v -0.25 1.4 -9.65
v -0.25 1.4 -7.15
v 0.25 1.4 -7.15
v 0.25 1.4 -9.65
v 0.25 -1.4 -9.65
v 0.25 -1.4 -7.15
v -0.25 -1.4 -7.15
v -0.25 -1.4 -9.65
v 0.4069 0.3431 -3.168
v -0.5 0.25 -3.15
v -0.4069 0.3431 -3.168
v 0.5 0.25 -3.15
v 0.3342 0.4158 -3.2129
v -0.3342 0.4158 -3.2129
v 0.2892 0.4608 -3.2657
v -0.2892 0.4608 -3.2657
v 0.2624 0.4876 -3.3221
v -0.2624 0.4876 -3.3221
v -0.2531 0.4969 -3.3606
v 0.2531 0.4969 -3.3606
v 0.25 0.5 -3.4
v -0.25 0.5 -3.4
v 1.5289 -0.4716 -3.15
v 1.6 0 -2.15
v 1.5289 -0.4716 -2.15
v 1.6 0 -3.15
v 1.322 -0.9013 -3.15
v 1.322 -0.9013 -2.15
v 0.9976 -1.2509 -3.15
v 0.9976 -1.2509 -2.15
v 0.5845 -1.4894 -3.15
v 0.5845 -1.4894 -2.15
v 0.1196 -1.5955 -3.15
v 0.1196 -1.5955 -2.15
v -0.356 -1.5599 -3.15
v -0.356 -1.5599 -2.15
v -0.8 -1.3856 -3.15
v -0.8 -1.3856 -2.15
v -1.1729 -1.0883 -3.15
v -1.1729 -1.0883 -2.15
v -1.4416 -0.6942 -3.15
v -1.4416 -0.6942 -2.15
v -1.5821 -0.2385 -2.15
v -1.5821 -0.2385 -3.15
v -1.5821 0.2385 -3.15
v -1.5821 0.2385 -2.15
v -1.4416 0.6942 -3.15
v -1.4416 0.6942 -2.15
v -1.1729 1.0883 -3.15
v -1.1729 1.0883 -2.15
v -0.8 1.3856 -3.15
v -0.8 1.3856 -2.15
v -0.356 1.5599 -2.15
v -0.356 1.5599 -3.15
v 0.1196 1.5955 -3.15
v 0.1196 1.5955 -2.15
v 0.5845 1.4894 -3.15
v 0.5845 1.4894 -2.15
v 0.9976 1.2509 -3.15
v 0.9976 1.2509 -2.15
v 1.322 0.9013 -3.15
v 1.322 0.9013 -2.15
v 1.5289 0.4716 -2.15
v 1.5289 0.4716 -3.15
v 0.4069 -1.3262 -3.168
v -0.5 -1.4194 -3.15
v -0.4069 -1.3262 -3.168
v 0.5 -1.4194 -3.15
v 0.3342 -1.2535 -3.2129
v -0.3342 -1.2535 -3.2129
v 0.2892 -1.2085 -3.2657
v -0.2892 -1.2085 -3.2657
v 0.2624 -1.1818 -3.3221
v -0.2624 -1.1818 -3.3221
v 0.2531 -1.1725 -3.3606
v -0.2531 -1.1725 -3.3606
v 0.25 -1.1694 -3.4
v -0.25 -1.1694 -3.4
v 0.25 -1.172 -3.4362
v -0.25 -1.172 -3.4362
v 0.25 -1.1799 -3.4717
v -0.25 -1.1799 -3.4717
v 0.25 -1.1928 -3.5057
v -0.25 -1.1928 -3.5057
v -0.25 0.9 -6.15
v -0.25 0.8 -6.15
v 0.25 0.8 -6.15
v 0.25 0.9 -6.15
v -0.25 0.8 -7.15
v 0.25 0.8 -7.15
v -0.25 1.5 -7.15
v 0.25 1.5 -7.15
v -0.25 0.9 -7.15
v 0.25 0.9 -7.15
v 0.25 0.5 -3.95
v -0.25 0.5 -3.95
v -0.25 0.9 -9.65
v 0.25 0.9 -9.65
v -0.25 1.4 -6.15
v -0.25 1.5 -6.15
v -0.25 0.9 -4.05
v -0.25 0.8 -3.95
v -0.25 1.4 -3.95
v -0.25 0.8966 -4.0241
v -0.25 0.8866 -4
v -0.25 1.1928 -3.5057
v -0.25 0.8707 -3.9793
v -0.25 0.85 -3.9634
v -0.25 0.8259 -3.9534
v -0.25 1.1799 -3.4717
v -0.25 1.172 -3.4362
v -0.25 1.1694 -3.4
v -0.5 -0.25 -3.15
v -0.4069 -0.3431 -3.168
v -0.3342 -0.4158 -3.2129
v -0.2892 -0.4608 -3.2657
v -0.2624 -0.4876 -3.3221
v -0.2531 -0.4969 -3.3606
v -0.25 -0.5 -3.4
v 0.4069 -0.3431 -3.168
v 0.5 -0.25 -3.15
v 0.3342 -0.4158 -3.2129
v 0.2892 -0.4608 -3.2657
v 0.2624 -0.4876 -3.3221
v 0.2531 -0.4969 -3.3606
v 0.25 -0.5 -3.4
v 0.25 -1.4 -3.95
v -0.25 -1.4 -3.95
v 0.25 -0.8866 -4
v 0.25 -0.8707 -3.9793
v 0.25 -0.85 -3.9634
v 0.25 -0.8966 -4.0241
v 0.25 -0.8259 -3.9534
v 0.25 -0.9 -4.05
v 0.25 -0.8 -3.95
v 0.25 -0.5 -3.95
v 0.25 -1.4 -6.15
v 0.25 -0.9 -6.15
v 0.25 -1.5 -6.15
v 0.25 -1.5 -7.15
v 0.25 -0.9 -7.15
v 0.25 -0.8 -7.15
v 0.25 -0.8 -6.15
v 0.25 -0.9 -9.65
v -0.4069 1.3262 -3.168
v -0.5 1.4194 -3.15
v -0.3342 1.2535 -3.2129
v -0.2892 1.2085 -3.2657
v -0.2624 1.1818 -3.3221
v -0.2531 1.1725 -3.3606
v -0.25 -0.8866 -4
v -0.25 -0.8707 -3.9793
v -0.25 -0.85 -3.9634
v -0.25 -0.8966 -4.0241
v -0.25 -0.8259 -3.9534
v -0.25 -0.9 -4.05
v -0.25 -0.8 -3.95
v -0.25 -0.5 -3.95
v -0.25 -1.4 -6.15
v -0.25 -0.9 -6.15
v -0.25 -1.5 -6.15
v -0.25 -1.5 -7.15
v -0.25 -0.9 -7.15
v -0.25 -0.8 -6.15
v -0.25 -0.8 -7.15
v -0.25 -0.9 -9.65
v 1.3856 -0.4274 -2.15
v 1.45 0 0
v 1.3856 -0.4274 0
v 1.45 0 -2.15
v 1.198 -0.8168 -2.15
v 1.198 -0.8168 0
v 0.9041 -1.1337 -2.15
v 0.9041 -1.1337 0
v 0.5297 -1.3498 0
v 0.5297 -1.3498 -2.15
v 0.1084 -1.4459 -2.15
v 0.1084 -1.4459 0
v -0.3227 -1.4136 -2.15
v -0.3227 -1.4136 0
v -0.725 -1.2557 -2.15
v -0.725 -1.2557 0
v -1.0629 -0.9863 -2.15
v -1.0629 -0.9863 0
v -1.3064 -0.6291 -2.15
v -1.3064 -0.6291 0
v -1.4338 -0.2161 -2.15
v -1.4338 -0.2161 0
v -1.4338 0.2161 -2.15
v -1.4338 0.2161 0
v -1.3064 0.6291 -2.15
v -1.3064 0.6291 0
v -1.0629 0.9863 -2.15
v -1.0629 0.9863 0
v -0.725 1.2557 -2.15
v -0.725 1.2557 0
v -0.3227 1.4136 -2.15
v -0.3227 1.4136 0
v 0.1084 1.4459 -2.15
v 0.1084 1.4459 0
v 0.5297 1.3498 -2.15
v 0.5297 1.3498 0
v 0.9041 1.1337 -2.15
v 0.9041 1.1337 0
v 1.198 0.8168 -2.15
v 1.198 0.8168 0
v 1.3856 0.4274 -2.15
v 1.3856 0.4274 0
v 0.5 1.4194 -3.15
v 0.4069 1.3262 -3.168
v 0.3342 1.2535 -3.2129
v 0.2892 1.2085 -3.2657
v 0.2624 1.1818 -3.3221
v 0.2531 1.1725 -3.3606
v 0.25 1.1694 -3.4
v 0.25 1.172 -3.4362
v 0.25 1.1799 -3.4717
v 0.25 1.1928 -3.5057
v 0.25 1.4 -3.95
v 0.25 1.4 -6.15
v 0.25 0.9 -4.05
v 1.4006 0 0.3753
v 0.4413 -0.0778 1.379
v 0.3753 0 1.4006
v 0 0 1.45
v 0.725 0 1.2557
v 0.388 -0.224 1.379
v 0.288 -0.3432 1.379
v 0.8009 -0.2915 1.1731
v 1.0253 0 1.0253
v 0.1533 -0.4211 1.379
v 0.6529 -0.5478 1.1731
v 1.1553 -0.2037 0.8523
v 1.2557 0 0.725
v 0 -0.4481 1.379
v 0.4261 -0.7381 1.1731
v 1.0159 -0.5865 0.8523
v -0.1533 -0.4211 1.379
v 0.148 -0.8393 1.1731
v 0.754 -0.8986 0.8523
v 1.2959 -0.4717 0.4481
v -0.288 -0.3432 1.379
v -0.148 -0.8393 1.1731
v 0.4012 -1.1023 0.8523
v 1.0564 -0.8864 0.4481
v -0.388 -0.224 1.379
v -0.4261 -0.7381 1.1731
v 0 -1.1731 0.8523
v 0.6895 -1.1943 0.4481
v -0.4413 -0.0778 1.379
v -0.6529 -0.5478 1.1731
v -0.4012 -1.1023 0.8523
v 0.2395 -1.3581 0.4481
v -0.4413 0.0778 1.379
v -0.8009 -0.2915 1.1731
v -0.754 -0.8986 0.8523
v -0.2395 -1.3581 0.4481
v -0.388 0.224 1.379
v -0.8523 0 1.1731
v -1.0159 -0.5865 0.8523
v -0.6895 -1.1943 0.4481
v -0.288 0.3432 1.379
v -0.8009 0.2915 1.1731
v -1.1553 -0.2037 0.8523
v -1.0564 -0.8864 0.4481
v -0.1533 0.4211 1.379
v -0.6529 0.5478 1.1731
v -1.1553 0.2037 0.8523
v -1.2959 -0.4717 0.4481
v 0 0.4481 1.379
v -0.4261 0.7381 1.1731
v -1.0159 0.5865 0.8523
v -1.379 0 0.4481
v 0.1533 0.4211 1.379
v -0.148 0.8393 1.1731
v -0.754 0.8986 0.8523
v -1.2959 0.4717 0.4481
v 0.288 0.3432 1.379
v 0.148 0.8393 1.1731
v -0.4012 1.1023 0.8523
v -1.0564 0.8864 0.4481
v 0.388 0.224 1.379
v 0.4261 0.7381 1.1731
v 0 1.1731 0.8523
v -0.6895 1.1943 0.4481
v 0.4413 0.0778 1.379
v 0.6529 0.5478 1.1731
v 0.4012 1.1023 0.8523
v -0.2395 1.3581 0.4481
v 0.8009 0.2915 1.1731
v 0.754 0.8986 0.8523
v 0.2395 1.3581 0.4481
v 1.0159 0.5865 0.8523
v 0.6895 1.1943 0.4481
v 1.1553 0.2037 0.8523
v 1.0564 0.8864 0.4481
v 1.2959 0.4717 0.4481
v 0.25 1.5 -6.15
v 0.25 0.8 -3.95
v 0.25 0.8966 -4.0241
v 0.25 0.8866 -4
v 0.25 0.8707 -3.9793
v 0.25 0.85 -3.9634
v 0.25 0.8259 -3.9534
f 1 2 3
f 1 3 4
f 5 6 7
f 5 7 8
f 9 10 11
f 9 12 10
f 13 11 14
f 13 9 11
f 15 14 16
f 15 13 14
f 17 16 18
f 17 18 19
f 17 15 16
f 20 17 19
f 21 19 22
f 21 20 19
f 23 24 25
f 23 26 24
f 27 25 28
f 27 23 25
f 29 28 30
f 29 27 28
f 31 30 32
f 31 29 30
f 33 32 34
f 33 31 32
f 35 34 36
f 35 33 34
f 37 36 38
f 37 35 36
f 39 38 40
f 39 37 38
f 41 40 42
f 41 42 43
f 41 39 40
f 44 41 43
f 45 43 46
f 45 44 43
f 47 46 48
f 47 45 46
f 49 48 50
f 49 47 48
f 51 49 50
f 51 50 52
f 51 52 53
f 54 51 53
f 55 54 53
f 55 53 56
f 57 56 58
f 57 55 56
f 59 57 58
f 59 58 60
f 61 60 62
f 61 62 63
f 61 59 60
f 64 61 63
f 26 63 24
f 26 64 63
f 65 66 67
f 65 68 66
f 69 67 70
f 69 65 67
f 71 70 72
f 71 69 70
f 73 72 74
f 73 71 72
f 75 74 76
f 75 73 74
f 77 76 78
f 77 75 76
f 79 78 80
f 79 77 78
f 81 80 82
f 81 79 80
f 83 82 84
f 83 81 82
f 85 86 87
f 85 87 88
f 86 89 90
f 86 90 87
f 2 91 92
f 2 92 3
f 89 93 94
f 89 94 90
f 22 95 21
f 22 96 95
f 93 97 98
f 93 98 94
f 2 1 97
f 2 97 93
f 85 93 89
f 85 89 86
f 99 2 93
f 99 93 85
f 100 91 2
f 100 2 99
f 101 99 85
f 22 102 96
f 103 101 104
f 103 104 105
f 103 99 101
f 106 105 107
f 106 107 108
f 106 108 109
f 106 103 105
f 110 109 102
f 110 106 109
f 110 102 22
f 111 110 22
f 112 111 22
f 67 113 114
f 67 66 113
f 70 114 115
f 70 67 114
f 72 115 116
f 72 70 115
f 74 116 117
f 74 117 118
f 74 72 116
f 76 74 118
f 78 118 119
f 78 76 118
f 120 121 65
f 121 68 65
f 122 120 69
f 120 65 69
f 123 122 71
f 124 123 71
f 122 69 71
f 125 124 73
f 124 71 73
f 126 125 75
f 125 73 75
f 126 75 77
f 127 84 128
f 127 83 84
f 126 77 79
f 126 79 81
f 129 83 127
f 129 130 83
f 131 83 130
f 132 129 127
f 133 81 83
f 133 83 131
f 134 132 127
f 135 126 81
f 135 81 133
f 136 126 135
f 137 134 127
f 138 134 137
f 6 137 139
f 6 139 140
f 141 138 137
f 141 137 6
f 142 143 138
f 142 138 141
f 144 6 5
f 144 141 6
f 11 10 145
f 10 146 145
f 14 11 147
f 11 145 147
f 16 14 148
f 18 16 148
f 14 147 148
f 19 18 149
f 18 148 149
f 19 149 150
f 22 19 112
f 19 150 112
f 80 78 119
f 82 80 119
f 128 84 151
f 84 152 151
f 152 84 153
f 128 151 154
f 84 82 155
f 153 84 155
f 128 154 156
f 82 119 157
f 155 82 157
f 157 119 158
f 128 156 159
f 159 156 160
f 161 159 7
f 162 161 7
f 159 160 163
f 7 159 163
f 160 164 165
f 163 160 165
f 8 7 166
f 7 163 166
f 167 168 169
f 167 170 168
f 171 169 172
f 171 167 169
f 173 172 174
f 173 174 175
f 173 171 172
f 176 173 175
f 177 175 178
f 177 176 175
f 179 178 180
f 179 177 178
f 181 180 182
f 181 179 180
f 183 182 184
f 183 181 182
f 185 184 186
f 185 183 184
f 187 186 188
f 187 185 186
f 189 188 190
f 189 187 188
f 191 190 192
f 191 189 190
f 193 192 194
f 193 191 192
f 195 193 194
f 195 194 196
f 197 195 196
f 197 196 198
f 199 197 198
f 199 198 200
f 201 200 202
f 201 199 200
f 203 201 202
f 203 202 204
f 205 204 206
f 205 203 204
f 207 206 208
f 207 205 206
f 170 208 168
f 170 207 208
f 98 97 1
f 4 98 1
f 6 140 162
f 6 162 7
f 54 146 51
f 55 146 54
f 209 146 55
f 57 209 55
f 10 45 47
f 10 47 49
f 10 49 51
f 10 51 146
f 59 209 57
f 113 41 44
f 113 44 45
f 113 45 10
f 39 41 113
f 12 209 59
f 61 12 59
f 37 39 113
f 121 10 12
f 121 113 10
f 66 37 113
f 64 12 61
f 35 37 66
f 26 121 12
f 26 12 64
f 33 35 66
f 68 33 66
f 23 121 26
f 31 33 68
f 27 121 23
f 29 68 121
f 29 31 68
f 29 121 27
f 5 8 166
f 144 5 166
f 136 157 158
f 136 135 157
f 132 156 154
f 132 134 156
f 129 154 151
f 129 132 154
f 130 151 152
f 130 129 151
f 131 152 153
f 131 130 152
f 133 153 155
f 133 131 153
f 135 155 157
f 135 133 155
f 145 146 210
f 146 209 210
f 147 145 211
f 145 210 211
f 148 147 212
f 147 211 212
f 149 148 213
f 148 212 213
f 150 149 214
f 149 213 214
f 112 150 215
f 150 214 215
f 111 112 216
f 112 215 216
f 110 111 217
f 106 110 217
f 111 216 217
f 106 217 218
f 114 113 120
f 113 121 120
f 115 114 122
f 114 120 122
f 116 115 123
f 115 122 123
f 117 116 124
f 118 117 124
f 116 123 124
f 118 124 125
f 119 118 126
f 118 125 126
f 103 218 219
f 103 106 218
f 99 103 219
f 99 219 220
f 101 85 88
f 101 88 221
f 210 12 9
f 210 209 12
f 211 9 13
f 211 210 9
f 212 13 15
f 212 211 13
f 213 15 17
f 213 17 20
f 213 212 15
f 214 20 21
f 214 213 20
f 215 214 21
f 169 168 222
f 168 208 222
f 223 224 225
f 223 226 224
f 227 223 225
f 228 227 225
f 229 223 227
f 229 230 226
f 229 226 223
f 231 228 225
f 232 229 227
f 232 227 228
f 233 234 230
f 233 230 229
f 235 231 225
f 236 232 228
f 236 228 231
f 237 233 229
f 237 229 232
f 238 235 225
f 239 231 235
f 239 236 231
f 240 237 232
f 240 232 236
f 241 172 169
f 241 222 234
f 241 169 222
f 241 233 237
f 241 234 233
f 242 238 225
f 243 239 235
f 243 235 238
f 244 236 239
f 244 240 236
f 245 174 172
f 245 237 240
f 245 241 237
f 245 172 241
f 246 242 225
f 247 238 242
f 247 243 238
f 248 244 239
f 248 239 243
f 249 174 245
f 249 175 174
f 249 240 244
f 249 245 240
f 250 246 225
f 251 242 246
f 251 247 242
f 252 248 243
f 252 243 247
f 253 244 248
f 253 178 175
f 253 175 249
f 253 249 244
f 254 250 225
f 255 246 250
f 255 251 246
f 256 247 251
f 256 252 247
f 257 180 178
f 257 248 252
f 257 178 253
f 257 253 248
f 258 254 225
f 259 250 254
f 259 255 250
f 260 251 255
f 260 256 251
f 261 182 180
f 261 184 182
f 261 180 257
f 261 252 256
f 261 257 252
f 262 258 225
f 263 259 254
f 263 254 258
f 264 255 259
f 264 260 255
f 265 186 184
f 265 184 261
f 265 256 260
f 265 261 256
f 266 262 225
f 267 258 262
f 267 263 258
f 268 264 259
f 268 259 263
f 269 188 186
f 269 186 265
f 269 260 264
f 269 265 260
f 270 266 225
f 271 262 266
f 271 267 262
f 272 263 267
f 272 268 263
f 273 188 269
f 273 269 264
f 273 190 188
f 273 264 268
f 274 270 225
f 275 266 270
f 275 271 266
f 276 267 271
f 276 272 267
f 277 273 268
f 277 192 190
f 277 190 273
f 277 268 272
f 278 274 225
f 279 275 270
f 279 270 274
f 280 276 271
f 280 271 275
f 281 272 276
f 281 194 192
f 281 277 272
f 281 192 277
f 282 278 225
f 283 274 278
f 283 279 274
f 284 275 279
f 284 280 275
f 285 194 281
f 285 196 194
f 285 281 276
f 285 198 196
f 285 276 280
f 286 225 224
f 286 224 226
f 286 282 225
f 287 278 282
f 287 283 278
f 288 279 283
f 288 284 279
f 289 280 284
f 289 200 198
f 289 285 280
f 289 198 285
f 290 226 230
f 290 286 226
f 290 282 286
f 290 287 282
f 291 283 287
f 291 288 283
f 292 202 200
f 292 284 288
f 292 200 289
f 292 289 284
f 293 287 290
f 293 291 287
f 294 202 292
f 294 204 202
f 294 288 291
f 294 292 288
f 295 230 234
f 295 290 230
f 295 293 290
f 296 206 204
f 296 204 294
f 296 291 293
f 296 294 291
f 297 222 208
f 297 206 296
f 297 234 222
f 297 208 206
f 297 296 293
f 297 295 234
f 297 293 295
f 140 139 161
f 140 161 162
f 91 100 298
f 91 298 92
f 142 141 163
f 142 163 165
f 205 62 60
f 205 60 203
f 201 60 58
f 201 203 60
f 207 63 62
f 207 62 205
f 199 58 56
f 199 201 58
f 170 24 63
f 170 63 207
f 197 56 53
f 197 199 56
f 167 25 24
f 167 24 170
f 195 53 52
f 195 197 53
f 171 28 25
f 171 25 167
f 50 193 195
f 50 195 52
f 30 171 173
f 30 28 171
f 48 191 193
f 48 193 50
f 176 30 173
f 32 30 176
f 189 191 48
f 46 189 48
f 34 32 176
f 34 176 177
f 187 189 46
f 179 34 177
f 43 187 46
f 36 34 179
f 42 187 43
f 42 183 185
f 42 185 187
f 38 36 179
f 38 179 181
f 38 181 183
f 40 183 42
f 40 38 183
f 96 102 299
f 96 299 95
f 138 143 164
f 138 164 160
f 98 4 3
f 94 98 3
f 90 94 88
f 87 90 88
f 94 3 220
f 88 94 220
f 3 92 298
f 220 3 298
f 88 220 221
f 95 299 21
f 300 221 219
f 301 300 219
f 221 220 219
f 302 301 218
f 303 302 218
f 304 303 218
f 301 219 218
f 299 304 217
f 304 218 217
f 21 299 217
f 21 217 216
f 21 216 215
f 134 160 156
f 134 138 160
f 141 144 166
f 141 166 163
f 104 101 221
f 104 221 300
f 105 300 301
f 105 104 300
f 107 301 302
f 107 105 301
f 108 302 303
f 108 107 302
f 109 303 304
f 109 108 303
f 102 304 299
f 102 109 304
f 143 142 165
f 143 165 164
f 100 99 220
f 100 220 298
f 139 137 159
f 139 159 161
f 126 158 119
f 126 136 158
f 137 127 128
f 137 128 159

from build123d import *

# Parameters (mm, degrees)
EXTRUDE1_DEPTH          = 0.25
FILLET1_R               = 0.25
CUT_EXTRUDE1_DEPTH      = 31.234789562
CUT_EXTRUDE1_DEPTH_BACK = 31.234789562
SKETCH3_W               = 12.882415547
SKETCH3_H               = 2.8
CUT_EXTRUDE2_DEPTH      = 19.290502996
CUT_EXTRUDE2_DEPTH_BACK = 19.290502996
SKETCH4_W               = 11.746427447
SKETCH4_H               = 5.813888333


with BuildPart() as part:
    # Sketch1 → Revolve1 (revolve)
    with BuildSketch(Plane(origin=(0, 0, 0), x_dir=(0, 0, -1), z_dir=(1, 0, 0)), mode=Mode.PRIVATE) as revolve1_sk:
        with BuildLine():
            Line((0, 1.45), (2.15, 1.45))
            Line((2.15, 1.45), (2.15, 1.599999975))
            Line((2.15, 1.599999975), (3.15, 1.599999975))
            Line((3.15, 1.599999975), (3.15, 0))
            Line((3.15, 0), (-1.45, 0))
            ThreePointArc((-1.45, 0), (-1.025304833, 1.025304833), (0, 1.45))
        make_face()
    revolve(revolve1_sk.sketch.rotate(Axis((0, 0, 0), (0, 0, -1)), 90), axis=Axis((0, 0, 0), (0, 0, -1)))

    # Sketch2 → Extrude1 (add, symmetric)
    with BuildSketch(Plane(origin=(0, 0, 0), x_dir=(0, 0, -1), z_dir=(1, 0, 0))):
        with BuildLine():
            Line((3.15, 1.026953873), (3.95, 1.4))
            Line((3.95, 1.4), (6.15, 1.4))
            Line((6.15, 1.4), (6.15, 1.5))
            Line((6.15, 1.5), (7.15, 1.5))
            Line((7.15, 1.5), (7.15, 1.4))
            Line((7.15, 1.4), (30.15, 1.4))
            Line((30.15, 1.4), (30.15, 0.9))
            Line((30.15, 0.9), (7.15, 0.9))
            Line((7.15, 0.9), (7.15, 0.8))
            Line((7.15, 0.8), (6.15, 0.8))
            Line((6.15, 0.8), (6.15, 0.9))
            Line((6.15, 0.9), (4.05, 0.9))
            ThreePointArc((4.05, 0.9), (3.979289322, 0.870710678), (3.95, 0.8))
            Line((3.95, 0.8), (3.95, 0.5))
            Line((3.95, 0.5), (3.15, 0.5))
            Line((3.15, 0.5), (3.15, 1.026953873))
        make_face()
        with BuildLine():
            Line((3.95, -0.8), (3.95, -0.5))
            Line((3.95, -0.5), (3.15, -0.5))
            Line((3.15, -0.5), (3.15, -1.026953873))
            Line((3.15, -1.026953873), (3.95, -1.4))
            Line((3.95, -1.4), (6.15, -1.4))
            Line((6.15, -1.4), (6.15, -1.5))
            Line((6.15, -1.5), (7.15, -1.5))
            Line((7.15, -1.5), (7.15, -1.4))
            Line((7.15, -1.4), (30.15, -1.4))
            Line((30.15, -1.4), (30.15, -0.9))
            Line((30.15, -0.9), (7.15, -0.9))
            Line((7.15, -0.9), (7.15, -0.8))
            Line((7.15, -0.8), (6.15, -0.8))
            Line((6.15, -0.8), (6.15, -0.9))
            Line((6.15, -0.9), (4.05, -0.9))
            ThreePointArc((4.05, -0.9), (3.979289322, -0.870710678), (3.95, -0.8))
        make_face()
    extrude(amount=EXTRUDE1_DEPTH, both=True)

    # Fillet1
    fillet1_edges = [part.edges().sort_by_distance(p)[0] for p in [
        (-0.25, 0.763476937, -3.15),
        (0, 1.026953873, -3.15),
        (0, 0.5, -3.15),
        (0.25, 0.763476937, -3.15),
        (-0.25, -0.763476937, -3.15),
        (0, -0.5, -3.15),
        (0, -1.026953873, -3.15),
        (0.25, -0.763476937, -3.15),
    ]]
    fillet(fillet1_edges, radius=FILLET1_R)

    # Sketch3 → Cut-Extrude1 (cut, two sides: drawn at the far end of the back side and taken through both)
    with BuildSketch(Plane(origin=(0, 0, 0), x_dir=(0, 0, -1), z_dir=(1, 0, 0)).offset(-CUT_EXTRUDE1_DEPTH_BACK)):
        with Locations((24.591207774, 0)):
            Rectangle(SKETCH3_W, SKETCH3_H)
    extrude(amount=CUT_EXTRUDE1_DEPTH + CUT_EXTRUDE1_DEPTH_BACK, mode=Mode.SUBTRACT)

    # Sketch4 → Cut-Extrude2 (cut, two sides: drawn at the far end of the back side and taken through both)
    with BuildSketch(Plane(origin=(0, 0, 0), x_dir=(0, 0, -1), z_dir=(1, 0, 0)).offset(-CUT_EXTRUDE2_DEPTH_BACK)):
        with Locations((15.523213723, 0.186451229)):
            Rectangle(SKETCH4_W, SKETCH4_H)
    extrude(amount=CUT_EXTRUDE2_DEPTH + CUT_EXTRUDE2_DEPTH_BACK, mode=Mode.SUBTRACT)


solid = part.part
